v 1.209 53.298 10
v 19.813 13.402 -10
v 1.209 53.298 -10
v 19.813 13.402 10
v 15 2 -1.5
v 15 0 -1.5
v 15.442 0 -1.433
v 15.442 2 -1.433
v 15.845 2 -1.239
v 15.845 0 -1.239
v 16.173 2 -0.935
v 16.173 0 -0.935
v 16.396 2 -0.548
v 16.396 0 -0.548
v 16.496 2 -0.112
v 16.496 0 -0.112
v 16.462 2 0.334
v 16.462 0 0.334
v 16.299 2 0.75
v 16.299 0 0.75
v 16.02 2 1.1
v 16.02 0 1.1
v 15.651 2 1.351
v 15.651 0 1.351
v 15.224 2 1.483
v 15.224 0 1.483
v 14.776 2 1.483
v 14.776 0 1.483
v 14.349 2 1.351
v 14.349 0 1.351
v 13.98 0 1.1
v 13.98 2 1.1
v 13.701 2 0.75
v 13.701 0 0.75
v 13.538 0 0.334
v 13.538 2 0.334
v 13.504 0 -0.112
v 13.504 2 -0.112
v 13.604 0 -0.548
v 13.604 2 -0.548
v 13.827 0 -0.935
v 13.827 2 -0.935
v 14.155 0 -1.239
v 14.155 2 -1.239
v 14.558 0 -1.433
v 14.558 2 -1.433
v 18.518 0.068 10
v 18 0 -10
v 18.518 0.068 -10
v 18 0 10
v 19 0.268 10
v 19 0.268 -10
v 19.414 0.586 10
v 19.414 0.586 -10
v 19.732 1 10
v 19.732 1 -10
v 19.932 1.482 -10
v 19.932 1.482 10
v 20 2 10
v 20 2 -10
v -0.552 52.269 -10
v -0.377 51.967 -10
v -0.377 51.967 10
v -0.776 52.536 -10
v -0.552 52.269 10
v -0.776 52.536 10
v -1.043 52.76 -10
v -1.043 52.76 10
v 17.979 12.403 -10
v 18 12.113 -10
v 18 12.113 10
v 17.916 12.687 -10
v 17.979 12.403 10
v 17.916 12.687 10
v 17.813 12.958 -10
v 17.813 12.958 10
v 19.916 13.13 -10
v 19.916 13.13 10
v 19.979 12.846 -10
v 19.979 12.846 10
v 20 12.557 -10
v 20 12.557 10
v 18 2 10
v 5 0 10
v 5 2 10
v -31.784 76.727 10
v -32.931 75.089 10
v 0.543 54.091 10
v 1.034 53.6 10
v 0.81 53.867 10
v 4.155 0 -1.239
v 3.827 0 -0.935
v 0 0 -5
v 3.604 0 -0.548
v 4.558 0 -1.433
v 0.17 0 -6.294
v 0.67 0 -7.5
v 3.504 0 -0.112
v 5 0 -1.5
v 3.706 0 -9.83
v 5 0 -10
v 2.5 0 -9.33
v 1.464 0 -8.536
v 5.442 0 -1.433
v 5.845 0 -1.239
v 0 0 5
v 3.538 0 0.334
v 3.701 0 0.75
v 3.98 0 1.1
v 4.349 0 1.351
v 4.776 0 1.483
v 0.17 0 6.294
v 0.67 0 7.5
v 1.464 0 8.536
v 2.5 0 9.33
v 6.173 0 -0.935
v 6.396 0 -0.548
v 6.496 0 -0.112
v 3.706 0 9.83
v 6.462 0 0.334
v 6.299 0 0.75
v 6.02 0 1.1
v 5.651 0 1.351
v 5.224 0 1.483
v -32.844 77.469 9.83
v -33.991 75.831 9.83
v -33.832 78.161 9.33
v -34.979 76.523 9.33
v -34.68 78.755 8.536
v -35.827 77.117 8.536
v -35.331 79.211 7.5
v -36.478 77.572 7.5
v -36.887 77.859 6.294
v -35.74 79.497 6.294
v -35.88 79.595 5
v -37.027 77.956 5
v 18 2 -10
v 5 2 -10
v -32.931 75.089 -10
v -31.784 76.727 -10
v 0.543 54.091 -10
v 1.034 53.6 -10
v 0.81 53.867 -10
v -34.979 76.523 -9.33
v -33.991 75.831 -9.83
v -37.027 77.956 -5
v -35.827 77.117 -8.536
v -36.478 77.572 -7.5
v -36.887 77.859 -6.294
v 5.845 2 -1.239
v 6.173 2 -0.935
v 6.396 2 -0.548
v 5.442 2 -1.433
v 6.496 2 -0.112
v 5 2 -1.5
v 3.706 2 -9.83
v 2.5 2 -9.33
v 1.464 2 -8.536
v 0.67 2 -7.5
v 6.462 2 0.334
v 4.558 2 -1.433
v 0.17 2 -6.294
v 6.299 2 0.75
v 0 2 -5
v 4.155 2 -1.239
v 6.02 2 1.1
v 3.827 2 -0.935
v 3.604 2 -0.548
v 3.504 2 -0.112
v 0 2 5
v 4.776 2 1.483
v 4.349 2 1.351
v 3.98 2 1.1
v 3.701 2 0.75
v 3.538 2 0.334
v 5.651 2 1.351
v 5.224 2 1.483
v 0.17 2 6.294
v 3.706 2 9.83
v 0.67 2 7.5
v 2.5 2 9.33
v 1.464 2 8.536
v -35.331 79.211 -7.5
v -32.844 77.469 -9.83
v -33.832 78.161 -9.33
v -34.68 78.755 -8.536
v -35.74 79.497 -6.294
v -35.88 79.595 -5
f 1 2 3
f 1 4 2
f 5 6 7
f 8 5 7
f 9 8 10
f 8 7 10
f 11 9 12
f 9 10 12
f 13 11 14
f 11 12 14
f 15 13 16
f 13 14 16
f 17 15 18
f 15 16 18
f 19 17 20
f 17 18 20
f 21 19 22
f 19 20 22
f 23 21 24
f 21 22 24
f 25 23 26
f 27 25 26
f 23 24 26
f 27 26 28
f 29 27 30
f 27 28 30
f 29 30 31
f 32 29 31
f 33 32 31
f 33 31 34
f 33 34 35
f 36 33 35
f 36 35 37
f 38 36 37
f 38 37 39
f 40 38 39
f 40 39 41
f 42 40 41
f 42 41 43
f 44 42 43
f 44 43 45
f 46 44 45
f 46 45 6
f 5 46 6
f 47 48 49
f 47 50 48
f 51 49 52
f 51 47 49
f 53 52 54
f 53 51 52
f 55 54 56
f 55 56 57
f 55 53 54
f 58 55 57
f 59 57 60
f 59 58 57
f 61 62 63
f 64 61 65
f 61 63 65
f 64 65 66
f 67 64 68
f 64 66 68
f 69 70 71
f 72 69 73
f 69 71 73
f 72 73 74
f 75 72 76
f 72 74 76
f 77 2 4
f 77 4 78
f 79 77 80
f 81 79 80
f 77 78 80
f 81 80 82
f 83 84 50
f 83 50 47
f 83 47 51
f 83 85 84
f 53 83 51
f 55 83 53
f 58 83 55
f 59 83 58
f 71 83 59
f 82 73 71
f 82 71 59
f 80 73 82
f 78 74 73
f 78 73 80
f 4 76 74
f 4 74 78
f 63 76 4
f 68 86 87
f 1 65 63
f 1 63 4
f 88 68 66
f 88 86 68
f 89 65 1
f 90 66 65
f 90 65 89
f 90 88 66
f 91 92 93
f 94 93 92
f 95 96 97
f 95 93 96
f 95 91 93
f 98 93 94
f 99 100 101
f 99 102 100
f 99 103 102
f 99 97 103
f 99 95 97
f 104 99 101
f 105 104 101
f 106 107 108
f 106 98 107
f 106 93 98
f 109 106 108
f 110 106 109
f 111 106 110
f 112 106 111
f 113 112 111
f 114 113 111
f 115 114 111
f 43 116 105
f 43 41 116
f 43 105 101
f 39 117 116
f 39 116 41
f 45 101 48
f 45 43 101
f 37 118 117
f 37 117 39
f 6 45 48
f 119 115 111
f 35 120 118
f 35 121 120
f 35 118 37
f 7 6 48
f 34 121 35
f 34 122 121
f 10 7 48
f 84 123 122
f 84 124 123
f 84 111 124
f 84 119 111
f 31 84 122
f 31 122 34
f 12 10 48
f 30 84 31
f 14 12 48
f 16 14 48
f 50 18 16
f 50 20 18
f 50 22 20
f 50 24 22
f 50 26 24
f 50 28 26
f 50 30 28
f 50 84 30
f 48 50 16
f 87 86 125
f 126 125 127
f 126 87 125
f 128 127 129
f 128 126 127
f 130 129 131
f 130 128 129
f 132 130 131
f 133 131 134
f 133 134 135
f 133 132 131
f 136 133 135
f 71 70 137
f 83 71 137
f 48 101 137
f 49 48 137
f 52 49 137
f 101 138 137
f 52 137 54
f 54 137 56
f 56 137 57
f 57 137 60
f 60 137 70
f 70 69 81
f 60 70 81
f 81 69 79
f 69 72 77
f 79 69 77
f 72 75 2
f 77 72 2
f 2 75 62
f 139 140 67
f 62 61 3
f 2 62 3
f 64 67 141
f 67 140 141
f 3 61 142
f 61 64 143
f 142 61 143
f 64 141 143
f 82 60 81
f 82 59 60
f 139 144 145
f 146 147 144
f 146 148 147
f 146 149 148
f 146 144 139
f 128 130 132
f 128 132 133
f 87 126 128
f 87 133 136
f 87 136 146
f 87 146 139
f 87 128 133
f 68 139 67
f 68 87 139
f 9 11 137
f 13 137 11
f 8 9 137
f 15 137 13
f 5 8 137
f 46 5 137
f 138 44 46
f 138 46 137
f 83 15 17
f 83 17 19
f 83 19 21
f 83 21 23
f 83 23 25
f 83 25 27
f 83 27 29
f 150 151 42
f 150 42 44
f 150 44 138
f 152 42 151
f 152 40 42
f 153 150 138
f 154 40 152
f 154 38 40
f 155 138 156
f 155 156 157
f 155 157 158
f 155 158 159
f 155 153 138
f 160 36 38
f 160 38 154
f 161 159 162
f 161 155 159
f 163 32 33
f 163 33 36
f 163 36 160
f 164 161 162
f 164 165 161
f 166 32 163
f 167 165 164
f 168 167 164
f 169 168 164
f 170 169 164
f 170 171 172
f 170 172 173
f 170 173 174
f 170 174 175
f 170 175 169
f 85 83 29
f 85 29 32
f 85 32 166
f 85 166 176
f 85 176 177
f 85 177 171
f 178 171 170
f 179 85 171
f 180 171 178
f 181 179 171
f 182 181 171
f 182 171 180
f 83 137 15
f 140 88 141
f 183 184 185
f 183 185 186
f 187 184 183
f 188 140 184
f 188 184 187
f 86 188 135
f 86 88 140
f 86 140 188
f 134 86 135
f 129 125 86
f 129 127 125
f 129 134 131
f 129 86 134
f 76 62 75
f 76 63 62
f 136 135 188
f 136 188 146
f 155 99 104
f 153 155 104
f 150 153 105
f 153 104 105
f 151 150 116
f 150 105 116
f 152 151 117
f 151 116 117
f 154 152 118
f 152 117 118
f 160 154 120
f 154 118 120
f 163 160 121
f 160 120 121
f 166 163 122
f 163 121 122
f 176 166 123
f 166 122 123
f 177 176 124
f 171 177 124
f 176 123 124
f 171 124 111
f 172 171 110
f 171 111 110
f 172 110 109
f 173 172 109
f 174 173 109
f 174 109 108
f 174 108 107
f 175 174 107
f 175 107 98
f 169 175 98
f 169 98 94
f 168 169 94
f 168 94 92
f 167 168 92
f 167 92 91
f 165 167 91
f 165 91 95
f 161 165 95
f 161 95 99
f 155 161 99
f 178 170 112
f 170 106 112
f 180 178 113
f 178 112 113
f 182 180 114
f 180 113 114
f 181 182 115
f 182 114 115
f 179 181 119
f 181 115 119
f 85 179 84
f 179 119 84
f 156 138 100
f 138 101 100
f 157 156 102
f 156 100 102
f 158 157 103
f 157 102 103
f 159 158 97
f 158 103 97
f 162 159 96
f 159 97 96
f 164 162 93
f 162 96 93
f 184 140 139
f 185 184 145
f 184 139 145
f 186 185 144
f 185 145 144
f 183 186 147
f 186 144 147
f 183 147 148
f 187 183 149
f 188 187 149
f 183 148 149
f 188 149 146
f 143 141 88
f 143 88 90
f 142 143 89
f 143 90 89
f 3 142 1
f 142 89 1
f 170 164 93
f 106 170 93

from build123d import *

# Parameters (mm, degrees)
BOSS_EXTRUDE1_DEPTH = 10
FILLET1_R           = 2
FILLET2_R           = 5
SKETCH2_R           = 1.5
CUT_EXTRUDE1_DEPTH  = 3


with BuildPart() as part:
    # Sketch1 → Boss-Extrude1 (new, symmetric)
    with BuildSketch(Plane.XY):
        Polygon((0, 0), (20, 0), (20, 13), (0.982178222, 53.783850417), (-35.879663771, 79.594790052), (-37.026816644, 77.956485964), (-0.603956909, 52.452925014), (18, 12.556610675), (18, 2), (0, 2), align=None)
    extrude(amount=BOSS_EXTRUDE1_DEPTH, both=True)

    # Fillet1
    fillet1_edges = [part.edges().sort_by_distance(p)[0] for p in [
        (18, 12.556610675, 0),
        (-0.603956909, 52.452925014, 0),
        (0.982178222, 53.783850417, 0),
        (20, 13, 0),
        (20, 0, 0),
    ]]
    fillet(fillet1_edges, radius=FILLET1_R)

    # Fillet2
    fillet2_edges = [part.edges().sort_by_distance(p)[0] for p in [
        (-36.453240208, 78.775638008, -10),
        (0, 1, -10),
        (-36.453240208, 78.775638008, 10),
        (0, 1, 10),
    ]]
    fillet(fillet2_edges, radius=FILLET2_R)

    # Sketch2 → Cut-Extrude1 (cut)
    with BuildSketch(Plane.XZ):
        with Locations(Location((5, 0, 0), (0, 0, 270))):
            Circle(SKETCH2_R)
        with Locations(Location((15, 0, 0), (0, 0, 270))):
            Circle(SKETCH2_R)
    extrude(amount=-CUT_EXTRUDE1_DEPTH, mode=Mode.SUBTRACT)


solid = part.part
